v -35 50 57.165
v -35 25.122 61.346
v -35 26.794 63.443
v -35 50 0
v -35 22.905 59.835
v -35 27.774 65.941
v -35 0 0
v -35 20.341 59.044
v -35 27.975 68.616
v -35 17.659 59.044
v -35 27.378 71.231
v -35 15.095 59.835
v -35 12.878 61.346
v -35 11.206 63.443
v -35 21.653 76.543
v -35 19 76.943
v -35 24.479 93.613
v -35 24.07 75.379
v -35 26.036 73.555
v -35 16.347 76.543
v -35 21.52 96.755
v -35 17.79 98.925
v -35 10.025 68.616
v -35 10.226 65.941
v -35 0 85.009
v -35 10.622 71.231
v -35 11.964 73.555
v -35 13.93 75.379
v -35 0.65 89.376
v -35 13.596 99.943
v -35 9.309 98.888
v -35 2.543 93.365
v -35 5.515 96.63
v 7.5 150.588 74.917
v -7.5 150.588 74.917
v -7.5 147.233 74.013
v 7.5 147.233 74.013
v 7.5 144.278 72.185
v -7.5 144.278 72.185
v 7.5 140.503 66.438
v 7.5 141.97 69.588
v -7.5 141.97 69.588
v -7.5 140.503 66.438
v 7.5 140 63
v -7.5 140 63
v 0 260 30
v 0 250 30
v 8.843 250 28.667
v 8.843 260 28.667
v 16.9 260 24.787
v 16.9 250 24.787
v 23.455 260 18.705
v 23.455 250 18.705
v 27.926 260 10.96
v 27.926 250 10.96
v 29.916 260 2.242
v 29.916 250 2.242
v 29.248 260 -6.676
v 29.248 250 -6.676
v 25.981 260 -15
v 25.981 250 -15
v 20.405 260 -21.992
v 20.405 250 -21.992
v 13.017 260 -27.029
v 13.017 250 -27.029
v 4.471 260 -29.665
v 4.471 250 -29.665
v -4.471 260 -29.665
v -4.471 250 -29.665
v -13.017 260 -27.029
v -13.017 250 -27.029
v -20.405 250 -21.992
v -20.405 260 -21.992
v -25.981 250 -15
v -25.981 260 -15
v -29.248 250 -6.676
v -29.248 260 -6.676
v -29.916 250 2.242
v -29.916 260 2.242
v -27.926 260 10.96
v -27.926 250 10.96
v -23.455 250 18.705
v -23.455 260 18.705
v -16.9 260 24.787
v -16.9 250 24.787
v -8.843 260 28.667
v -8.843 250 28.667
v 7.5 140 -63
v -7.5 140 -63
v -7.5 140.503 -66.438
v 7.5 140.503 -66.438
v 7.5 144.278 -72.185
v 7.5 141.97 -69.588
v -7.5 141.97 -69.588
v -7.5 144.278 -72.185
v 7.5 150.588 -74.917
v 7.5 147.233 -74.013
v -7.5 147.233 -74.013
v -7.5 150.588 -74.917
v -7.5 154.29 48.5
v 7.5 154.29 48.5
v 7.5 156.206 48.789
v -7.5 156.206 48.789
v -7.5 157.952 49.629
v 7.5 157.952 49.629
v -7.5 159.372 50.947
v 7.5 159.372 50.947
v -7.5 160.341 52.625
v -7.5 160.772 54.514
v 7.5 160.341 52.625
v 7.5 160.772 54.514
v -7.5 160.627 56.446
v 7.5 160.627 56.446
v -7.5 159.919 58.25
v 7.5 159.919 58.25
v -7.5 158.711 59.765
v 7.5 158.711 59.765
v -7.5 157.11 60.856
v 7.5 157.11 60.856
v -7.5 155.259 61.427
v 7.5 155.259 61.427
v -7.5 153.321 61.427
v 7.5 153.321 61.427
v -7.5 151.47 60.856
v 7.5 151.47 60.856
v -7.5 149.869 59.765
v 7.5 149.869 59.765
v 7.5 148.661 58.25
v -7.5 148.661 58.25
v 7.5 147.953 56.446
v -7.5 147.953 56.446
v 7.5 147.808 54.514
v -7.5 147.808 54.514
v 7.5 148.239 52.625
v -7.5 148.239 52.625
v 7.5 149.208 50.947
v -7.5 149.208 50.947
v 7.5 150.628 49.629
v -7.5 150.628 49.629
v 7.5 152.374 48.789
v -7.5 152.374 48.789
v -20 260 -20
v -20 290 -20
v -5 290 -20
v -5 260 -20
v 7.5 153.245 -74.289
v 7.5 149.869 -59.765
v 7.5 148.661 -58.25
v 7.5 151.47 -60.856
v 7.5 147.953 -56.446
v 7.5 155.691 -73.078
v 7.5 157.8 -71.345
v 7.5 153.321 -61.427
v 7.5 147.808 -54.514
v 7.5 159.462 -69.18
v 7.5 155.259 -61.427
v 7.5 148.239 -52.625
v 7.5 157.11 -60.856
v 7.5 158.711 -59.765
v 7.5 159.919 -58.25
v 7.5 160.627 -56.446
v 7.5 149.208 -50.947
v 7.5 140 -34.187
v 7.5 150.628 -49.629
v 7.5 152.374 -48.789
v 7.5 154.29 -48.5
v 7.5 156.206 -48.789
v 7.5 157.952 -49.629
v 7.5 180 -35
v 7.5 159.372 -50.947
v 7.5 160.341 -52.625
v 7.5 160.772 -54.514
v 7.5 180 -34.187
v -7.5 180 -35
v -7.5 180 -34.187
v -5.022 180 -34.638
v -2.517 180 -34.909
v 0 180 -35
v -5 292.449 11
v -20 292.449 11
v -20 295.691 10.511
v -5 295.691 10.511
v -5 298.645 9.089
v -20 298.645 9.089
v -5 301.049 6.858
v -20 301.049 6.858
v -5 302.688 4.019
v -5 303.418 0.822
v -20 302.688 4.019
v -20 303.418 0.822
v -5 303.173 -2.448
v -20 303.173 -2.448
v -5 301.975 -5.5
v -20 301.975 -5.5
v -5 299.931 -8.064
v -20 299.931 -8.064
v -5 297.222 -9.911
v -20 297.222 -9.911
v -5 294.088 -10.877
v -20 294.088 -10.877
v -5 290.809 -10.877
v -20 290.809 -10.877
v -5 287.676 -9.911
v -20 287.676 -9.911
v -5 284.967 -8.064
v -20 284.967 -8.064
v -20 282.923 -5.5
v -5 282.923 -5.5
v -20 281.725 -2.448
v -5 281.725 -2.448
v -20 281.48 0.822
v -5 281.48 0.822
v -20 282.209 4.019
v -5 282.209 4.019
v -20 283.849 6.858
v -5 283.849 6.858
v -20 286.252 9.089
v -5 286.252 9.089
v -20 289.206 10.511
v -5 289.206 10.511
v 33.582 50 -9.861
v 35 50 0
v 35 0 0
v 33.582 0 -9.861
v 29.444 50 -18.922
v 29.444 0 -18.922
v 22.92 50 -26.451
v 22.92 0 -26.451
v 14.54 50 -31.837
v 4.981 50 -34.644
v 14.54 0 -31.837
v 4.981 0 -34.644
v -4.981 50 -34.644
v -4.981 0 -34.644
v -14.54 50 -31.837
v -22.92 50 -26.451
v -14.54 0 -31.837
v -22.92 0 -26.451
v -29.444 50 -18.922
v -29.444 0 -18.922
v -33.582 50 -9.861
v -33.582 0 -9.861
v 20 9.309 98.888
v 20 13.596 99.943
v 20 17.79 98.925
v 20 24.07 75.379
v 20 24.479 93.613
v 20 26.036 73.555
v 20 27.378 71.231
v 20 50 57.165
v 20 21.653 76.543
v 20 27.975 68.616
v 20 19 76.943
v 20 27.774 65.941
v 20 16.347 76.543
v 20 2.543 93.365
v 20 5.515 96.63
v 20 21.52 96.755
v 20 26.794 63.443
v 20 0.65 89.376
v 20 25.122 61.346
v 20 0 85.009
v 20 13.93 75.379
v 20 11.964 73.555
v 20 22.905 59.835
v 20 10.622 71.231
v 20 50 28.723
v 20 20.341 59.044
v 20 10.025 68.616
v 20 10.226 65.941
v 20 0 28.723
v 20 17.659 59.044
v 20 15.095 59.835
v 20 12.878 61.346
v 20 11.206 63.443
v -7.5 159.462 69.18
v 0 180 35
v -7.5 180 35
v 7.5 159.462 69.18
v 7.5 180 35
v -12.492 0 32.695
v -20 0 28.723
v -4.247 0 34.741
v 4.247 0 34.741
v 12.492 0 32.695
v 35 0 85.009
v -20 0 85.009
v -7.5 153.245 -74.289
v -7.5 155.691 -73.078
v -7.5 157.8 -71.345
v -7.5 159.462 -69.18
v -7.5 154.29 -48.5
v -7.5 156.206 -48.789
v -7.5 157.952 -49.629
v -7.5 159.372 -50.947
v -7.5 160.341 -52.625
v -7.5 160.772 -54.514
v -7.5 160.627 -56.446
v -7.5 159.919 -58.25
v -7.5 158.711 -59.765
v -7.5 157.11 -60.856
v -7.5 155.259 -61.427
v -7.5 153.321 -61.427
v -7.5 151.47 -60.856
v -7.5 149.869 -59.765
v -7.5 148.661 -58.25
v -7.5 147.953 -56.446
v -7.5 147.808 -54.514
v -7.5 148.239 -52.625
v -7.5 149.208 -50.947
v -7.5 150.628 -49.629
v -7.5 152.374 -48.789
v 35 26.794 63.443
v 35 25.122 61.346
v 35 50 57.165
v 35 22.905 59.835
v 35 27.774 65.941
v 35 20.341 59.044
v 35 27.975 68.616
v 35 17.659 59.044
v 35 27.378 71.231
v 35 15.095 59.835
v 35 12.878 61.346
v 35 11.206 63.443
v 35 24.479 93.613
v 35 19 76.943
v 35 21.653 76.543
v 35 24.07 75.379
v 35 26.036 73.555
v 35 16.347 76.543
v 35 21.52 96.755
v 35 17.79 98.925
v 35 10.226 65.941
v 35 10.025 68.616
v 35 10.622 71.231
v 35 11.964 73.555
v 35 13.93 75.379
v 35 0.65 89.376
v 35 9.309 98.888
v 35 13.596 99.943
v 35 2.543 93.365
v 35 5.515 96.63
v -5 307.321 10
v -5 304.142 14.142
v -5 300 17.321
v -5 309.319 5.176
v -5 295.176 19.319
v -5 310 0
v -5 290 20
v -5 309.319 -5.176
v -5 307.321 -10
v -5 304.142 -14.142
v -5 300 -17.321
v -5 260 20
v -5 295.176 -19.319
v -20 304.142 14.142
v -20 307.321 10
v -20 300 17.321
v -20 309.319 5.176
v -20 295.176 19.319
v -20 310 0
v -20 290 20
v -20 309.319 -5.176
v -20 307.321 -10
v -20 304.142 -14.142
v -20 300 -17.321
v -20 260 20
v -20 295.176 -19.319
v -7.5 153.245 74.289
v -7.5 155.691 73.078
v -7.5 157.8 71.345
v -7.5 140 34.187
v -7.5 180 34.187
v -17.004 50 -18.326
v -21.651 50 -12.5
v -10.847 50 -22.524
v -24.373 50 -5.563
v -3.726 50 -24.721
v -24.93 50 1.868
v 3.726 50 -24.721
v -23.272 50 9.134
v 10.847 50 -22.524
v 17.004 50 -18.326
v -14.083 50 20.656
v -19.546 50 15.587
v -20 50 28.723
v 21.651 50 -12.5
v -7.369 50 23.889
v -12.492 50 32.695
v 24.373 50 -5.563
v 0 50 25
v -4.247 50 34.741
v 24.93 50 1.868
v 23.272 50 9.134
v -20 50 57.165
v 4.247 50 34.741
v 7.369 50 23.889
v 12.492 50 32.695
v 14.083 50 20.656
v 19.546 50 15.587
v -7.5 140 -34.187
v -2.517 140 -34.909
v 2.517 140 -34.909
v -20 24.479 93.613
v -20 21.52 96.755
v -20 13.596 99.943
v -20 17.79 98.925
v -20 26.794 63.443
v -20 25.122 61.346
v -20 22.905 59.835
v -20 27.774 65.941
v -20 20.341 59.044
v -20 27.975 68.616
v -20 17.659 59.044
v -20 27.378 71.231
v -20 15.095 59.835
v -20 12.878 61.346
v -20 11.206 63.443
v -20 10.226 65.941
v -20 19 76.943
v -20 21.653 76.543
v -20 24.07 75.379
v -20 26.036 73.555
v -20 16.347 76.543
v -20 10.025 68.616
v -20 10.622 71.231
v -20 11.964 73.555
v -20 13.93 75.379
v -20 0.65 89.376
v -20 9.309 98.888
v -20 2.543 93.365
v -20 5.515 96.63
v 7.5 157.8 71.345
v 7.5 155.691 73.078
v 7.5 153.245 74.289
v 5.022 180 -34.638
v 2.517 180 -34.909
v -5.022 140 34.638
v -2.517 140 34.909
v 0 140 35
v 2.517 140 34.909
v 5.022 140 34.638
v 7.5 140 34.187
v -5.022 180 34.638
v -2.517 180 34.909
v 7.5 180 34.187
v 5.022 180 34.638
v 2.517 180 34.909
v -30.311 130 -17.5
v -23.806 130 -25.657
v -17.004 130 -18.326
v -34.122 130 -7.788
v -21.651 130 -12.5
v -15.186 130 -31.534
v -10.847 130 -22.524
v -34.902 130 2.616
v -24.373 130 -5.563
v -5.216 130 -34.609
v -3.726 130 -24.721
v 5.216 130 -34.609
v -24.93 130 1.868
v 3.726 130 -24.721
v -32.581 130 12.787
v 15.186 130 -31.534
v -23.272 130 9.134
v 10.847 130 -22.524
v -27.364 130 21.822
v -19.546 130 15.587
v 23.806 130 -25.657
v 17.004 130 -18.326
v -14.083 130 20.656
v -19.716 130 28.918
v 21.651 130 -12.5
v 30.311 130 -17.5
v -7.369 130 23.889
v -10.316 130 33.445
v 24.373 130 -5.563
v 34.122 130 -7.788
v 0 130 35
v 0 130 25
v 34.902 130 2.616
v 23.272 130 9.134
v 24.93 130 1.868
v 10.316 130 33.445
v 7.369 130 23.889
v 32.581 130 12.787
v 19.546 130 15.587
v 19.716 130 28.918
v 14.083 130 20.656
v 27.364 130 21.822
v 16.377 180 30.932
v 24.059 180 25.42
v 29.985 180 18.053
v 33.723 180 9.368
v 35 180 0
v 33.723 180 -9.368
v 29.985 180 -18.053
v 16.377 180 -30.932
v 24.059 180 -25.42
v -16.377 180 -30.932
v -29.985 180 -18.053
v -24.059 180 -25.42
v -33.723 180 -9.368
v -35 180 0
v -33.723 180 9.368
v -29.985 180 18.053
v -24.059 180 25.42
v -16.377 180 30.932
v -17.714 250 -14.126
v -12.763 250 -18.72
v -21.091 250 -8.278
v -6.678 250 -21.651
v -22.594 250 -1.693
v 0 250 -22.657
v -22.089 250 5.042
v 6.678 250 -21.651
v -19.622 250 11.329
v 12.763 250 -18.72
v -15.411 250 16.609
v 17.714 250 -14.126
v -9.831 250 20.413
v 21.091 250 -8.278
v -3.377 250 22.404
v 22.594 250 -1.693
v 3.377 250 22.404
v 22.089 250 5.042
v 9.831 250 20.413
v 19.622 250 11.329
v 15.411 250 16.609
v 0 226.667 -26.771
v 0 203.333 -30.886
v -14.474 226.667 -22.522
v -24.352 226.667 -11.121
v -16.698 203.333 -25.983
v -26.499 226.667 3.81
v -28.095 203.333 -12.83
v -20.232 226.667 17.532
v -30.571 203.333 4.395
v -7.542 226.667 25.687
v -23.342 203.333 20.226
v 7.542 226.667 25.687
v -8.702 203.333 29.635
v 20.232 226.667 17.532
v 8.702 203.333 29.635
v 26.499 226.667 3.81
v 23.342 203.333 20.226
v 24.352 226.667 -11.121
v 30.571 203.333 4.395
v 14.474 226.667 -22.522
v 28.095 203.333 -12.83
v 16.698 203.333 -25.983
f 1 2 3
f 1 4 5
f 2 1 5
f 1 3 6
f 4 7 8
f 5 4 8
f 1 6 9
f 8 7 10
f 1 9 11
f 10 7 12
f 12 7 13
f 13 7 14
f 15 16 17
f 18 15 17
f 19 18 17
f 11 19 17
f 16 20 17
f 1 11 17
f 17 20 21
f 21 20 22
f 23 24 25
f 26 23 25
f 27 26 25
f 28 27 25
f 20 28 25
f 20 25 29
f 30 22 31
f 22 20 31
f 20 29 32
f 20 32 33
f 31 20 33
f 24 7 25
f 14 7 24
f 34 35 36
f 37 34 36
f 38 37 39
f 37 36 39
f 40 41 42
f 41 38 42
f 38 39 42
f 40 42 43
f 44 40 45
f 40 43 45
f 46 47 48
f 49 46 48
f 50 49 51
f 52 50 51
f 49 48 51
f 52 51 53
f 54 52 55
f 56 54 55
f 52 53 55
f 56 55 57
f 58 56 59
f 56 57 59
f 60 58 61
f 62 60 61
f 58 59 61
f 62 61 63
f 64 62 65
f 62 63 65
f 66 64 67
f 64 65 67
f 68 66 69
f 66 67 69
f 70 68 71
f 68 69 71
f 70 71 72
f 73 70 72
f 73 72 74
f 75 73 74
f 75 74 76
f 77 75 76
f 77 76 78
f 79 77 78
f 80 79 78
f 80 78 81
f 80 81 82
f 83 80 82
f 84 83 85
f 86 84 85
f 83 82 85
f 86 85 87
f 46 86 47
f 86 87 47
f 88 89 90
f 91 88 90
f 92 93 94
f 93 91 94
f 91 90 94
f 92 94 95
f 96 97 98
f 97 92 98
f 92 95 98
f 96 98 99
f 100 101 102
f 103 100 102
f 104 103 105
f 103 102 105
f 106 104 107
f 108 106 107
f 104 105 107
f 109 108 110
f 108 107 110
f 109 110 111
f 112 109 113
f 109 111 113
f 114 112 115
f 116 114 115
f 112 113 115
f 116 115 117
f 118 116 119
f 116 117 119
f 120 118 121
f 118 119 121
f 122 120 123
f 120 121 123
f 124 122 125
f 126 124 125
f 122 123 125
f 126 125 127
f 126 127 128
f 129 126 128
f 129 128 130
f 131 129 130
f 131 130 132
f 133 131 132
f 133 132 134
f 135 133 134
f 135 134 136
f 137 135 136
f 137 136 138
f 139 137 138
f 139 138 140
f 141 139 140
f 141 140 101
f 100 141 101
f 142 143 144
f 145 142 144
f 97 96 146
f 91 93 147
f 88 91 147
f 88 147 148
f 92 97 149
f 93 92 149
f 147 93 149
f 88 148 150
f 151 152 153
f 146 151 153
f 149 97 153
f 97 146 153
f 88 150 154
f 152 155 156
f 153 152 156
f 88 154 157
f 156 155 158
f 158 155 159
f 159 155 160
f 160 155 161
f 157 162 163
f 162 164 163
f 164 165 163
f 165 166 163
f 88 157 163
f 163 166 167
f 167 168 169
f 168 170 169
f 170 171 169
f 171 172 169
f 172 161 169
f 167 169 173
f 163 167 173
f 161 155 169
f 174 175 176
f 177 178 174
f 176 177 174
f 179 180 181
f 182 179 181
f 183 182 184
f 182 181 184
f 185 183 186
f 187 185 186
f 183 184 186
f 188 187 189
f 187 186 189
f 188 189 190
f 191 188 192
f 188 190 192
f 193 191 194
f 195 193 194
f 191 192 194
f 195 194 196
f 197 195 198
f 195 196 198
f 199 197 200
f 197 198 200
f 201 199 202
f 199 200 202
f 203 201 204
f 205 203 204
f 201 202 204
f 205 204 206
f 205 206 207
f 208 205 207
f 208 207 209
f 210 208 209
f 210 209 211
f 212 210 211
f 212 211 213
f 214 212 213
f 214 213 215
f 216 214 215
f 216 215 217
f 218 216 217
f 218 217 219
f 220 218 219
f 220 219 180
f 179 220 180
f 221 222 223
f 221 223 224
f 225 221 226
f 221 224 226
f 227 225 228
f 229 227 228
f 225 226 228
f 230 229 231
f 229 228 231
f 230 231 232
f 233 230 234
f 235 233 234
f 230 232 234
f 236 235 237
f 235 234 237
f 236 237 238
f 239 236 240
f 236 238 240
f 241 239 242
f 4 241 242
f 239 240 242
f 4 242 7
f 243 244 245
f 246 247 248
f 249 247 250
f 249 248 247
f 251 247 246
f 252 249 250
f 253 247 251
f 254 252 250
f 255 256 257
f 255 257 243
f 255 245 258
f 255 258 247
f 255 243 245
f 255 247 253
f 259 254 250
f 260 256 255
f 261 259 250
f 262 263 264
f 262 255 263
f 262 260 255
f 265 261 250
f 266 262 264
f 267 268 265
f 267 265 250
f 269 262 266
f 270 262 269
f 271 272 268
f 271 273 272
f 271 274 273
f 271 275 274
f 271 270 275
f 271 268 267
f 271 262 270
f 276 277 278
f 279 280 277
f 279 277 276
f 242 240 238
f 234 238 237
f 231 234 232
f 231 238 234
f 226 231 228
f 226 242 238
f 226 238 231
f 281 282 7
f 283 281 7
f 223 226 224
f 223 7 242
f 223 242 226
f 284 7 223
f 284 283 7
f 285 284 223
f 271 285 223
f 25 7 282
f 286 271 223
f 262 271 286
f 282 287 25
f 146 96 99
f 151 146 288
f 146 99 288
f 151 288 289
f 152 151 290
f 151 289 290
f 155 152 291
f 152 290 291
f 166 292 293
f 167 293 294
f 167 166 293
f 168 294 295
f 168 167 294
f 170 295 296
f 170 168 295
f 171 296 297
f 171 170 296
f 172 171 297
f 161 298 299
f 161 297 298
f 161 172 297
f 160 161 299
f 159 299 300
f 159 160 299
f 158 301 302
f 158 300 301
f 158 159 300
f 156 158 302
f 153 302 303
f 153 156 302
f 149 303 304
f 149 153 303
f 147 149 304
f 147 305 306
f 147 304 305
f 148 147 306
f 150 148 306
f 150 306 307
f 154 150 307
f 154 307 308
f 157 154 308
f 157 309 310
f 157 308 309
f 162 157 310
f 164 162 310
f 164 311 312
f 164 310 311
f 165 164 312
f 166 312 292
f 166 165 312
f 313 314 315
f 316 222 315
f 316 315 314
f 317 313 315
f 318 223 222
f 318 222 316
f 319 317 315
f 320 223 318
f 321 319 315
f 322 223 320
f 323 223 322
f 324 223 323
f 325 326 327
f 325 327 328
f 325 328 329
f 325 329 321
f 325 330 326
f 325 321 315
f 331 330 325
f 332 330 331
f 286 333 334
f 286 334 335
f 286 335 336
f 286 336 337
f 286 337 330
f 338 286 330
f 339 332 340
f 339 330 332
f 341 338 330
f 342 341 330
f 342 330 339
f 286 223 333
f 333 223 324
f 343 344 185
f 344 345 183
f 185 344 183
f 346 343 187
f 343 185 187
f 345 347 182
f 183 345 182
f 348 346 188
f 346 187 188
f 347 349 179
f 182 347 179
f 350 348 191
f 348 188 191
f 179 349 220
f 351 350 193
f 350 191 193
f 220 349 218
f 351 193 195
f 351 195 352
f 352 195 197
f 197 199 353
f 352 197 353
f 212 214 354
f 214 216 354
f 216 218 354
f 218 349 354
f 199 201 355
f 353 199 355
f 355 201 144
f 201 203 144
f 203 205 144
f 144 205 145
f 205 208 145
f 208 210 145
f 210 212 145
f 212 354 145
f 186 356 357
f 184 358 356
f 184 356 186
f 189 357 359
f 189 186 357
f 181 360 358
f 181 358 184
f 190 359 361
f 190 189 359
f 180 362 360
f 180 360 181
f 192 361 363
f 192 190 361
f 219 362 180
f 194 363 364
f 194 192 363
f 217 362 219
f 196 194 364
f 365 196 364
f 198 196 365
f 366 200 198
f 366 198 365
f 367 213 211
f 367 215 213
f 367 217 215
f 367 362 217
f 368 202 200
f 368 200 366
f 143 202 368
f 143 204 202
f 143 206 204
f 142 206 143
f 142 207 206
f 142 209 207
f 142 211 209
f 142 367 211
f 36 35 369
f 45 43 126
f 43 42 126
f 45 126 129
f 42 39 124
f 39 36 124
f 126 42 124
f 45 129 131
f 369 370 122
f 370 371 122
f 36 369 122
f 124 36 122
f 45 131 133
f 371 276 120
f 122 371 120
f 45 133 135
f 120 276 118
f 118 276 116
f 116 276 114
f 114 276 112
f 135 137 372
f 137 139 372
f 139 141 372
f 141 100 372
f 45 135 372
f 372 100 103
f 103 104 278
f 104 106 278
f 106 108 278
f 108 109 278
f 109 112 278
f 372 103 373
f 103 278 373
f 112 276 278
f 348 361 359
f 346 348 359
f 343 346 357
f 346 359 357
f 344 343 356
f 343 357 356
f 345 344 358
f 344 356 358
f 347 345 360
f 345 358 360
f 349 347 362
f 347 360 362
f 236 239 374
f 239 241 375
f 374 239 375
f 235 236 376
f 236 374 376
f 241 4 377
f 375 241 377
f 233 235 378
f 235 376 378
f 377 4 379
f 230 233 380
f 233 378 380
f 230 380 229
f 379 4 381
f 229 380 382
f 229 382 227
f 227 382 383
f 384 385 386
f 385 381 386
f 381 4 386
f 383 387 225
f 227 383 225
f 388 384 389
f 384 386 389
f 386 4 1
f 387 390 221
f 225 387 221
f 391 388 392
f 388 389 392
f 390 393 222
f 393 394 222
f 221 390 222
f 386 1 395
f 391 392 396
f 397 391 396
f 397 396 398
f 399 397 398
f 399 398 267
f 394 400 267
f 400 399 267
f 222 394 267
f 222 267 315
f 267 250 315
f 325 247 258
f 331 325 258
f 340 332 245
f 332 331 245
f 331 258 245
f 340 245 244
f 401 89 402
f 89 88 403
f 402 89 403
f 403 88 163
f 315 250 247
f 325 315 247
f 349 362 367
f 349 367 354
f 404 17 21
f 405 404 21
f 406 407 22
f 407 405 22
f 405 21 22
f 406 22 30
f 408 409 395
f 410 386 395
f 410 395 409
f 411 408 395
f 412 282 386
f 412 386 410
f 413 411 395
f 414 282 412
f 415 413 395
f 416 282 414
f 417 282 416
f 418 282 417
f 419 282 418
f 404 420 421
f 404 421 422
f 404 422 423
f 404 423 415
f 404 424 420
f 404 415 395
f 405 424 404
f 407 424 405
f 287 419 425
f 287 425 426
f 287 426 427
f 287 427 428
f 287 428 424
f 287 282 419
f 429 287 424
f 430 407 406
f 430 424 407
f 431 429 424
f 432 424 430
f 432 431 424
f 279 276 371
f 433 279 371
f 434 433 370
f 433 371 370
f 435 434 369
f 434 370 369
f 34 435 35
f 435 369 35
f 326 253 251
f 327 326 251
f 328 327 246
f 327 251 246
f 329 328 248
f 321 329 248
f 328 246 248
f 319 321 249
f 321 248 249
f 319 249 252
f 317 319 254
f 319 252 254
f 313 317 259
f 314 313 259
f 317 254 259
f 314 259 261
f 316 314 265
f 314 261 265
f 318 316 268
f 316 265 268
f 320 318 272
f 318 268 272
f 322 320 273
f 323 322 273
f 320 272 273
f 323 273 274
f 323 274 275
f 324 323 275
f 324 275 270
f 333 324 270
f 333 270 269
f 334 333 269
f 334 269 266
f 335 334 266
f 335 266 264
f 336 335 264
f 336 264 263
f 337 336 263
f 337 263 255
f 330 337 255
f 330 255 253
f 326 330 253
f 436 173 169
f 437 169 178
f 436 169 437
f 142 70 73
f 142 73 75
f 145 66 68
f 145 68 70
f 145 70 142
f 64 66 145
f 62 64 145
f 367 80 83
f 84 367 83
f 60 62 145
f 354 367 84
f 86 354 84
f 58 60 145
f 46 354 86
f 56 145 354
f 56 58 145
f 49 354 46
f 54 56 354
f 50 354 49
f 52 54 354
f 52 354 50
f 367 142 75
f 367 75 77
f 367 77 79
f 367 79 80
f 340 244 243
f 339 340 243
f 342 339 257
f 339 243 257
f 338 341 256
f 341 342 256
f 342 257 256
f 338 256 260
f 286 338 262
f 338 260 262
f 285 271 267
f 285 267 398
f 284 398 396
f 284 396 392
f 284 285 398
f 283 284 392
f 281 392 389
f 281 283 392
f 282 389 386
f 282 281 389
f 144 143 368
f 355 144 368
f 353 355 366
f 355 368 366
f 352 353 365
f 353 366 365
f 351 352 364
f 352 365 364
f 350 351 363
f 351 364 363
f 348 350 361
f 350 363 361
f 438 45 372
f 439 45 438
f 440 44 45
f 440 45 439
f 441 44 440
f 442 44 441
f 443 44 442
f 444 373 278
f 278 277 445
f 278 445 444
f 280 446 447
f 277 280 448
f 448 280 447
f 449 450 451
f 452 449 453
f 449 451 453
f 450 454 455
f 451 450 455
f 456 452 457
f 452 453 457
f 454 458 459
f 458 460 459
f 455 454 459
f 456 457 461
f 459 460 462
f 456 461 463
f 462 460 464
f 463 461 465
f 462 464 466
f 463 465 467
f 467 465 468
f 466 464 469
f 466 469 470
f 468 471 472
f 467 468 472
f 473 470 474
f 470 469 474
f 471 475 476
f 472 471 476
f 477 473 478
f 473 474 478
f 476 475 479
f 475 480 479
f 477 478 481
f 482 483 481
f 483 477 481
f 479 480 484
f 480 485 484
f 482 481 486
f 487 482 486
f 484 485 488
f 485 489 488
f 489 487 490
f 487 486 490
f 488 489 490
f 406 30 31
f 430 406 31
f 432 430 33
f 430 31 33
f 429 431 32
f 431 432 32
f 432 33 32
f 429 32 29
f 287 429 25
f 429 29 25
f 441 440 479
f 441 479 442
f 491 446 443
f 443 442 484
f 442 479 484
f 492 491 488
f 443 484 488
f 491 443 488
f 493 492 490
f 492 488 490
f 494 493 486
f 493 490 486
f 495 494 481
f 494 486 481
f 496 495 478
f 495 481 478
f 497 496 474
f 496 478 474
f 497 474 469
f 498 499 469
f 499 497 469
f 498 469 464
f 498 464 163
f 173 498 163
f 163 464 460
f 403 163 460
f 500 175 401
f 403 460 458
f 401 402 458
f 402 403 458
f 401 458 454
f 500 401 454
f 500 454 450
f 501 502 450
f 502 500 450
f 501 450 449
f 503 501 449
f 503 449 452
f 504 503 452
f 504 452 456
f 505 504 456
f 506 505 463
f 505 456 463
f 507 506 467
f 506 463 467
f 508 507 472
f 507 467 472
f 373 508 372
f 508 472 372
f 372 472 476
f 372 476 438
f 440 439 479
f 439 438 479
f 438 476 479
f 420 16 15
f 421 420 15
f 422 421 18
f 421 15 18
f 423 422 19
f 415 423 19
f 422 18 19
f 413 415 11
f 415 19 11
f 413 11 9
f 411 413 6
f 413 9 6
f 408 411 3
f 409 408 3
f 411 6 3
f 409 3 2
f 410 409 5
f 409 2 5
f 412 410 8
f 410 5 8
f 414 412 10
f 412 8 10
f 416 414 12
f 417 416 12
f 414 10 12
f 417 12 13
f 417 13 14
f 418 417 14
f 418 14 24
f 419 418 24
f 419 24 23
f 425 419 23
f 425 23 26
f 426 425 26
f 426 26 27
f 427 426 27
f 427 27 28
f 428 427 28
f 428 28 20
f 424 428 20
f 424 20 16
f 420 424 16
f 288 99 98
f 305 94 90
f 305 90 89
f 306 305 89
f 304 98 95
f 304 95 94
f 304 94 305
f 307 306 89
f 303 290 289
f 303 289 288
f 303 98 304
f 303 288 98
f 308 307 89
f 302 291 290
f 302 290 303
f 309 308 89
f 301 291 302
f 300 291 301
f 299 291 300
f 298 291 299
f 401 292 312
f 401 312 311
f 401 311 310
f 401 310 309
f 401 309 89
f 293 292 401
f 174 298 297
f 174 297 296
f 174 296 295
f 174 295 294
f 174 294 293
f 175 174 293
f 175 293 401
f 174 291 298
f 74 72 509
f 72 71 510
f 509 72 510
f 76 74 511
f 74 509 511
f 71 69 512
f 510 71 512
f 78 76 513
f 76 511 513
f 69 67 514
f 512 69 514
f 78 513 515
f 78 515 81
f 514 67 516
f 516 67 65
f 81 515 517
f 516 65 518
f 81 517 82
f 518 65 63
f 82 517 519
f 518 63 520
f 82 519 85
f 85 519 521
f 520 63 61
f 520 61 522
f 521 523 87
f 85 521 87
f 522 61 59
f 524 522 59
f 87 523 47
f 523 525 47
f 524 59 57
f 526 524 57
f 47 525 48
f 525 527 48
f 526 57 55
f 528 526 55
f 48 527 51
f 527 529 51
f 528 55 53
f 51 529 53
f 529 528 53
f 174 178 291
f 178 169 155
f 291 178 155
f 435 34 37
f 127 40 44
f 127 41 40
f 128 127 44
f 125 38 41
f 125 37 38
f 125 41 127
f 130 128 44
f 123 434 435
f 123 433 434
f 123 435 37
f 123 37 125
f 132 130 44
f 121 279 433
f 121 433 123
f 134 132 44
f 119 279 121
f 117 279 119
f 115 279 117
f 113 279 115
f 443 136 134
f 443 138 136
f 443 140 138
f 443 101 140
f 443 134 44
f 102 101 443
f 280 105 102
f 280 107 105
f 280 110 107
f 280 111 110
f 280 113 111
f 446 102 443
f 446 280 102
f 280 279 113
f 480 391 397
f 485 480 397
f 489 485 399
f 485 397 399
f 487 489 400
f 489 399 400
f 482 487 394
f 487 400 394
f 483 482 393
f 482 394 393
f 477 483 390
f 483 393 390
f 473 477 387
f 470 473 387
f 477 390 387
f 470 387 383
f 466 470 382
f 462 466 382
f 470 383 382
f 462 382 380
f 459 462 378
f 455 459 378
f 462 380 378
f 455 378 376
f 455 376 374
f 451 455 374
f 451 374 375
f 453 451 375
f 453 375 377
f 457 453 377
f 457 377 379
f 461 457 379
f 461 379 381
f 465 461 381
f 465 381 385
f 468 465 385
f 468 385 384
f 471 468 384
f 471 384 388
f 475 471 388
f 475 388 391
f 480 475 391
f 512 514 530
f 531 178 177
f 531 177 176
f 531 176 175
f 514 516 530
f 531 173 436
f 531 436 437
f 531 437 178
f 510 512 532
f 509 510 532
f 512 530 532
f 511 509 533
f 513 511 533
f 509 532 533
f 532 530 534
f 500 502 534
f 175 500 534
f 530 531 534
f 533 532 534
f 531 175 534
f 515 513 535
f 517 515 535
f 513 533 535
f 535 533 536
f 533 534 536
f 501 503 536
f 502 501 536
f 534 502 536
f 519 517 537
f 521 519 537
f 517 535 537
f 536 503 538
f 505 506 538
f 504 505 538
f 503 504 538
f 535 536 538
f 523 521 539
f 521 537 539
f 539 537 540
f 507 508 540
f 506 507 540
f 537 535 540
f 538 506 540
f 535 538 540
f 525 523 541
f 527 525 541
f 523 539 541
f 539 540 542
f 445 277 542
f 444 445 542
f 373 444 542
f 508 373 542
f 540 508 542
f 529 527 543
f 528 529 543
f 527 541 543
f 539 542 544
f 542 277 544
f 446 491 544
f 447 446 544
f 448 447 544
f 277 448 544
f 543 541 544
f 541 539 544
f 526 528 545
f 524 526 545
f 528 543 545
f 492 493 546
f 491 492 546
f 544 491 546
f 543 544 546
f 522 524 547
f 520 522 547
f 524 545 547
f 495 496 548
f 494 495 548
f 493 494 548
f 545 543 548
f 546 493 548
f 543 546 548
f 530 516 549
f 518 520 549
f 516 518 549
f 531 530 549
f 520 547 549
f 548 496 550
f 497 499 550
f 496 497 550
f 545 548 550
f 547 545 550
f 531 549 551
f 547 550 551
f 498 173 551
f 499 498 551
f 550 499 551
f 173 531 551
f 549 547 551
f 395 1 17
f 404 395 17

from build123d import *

# Parameters (mm, degrees)
SKETCH1_R           = 35
BOSS_EXTRUDE1_DEPTH = 50
SKETCH6_R           = 25
BOSS_EXTRUDE2_DEPTH = 80
SKETCH7_R           = 35
BOSS_EXTRUDE3_DEPTH = 50
SKETCH10_R          = 30
BOSS_EXTRUDE5_DEPTH = 10
SKETCH12_W          = 70
SKETCH12_H          = 100.009163948
BOSS_EXTRUDE6_DEPTH = 50
CUT_EXTRUDE1_DEPTH  = 288.231322933
CUT_EXTRUDE2_DEPTH  = 281.761166962
FILLET1_R           = 15
SKETCH15_R          = 9
CUT_EXTRUDE3_DEPTH  = 288.208392811
BOSS_EXTRUDE8_DEPTH = 7.5
FILLET2_R           = 12
SKETCH17_R          = 6.5
CUT_EXTRUDE4_DEPTH  = 282.771025659
FILLET3_R           = 12
SKETCH18_W          = 15
SKETCH18_H          = 40
BOSS_EXTRUDE9_DEPTH = 50
CUT_EXTRUDE5_DEPTH  = 331.323570005
SKETCH20_R          = 11
CUT_EXTRUDE6_DEPTH  = 331.323570005


with BuildPart() as part:
    # Sketch1 → Boss-Extrude1 (new body)
    with BuildSketch(Plane(origin=(0, 0, 0), x_dir=(1, 0, 0), z_dir=(0, 1, 0))):
        with Locations(Location((0, 0, 0), (0, 0, 270))):
            Circle(SKETCH1_R)
    extrude(amount=BOSS_EXTRUDE1_DEPTH)

    # Sketch6 → Boss-Extrude2 (add)
    with BuildSketch(Plane(origin=(0, 50, 0), x_dir=(1, 0, 0), z_dir=(0, 1, 0))):
        with Locations(Location((0, 0, 0), (0, 0, 270))):
            Circle(SKETCH6_R)
    extrude(amount=BOSS_EXTRUDE2_DEPTH)

    # Sketch7 → Boss-Extrude3 (add)
    with BuildSketch(Plane(origin=(0, 130, 0), x_dir=(1, 0, 0), z_dir=(0, 1, 0))):
        with Locations(Location((0, 0, 0), (0, 0, 270))):
            Circle(SKETCH7_R)
    extrude(amount=BOSS_EXTRUDE3_DEPTH)



with BuildPart() as body_2:
    # Sketch10 → Boss-Extrude5 (new body)
    with BuildSketch(Plane(origin=(0, 250, 0), x_dir=(1, 0, 0), z_dir=(0, 1, 0))):
        with Locations(Location((0, 0, 0), (0, 0, 270))):
            Circle(SKETCH10_R)
    extrude(amount=BOSS_EXTRUDE5_DEPTH)


with BuildPart() as part_1:
    add(part.part)

    add(body_2.part)  # Revolve1 merges body 2
    # Sketch11 → Revolve1 (revolve)
    with BuildSketch(Plane(origin=(0, 0, 0), x_dir=(0, 0, -1), z_dir=(1, 0, 0))):
        Polygon((0, 250), (22.65711135, 250), (35, 180), (0, 180), align=None)
    revolve(axis=Axis((0, 180, 0), (0, 1, 0)))

    # Sketch12 → Boss-Extrude6 (add)
    with BuildSketch(Plane.XZ):
        with Locations((0, 50.004581974)):
            Rectangle(SKETCH12_W, SKETCH12_H)
    extrude(amount=-BOSS_EXTRUDE6_DEPTH)

    # Sketch13 → Cut-Extrude1 (cut, through all)
    with BuildSketch(Plane.ZY.offset(35)):
        Polygon((57.164723746, 50), (100.009163948, 20), (100.009163948, 50), align=None)
    extrude(amount=-CUT_EXTRUDE1_DEPTH, mode=Mode.SUBTRACT)

    # Sketch14 → Cut-Extrude2 (cut, through all)
    with BuildSketch(Plane.XZ):
        with BuildLine():
            Line((-20, 108.740570097), (20, 108.740570097))
            Line((20, 108.740570097), (20, 28.722813233))
            ThreePointArc((20, 28.722813233), (0, 35), (-20, 28.722813233))
            Line((-20, 28.722813233), (-20, 108.740570097))
        make_face()
    extrude(amount=-CUT_EXTRUDE2_DEPTH, mode=Mode.SUBTRACT)

    # Fillet1
    # the kernel refuses this fillet: 15 mm, written as the material it takes off along each edge
    with BuildSketch(Plane(origin=(-17.5, 0, 100.009163948), x_dir=(0, 0, -1), z_dir=(1, 0, 0)), Plane(origin=(-72.5, 0, 100.009163948), x_dir=(0, 0, -1), z_dir=(1, 0, 0))) as fillet1_piece_1:
        with BuildLine():
            CenterArc((FILLET1_R, FILLET1_R), FILLET1_R, 180, 90)
            Line((0, FILLET1_R), (0, 0))
            Line((0, 0), (FILLET1_R, 0))
        make_face()
    extrude(amount=90, mode=Mode.SUBTRACT)
    with BuildSketch(Plane(origin=(0.478735604, 20, 100.009163948), x_dir=(0, -1, 0), z_dir=(1, 0, 0)), Plane(origin=(-54.521264396, 20, 100.009163948), x_dir=(0, -1, 0), z_dir=(1, 0, 0))) as fillet1_piece_2:
        with BuildLine():
            CenterArc((FILLET1_R * 0.520567050552, FILLET1_R), FILLET1_R, 215, 55)
            Line((-FILLET1_R * 0.298584993737, FILLET1_R * 0.426423563649), (0, 0))
            Line((0, 0), (FILLET1_R * 0.520567050552, 0))
        make_face()
    extrude(amount=54.042528791, mode=Mode.SUBTRACT)

    # Sketch15 → Cut-Extrude3 (cut, through all)
    with BuildSketch(Plane.ZY.offset(35)):
        with Locations((67.943288424, 19)):
            Circle(SKETCH15_R)
    extrude(amount=-CUT_EXTRUDE3_DEPTH, mode=Mode.SUBTRACT)

    # Sketch16 → Boss-Extrude8 (add, symmetric)
    with BuildSketch(Plane(origin=(0, 0, 0), x_dir=(0, 0, -1), z_dir=(1, 0, 0))):
        Polygon((-35, 180), (-75, 155.965575239), (-75, 140), (-35, 140), (0, 140), (0, 180), align=None)
    boss_extrude8 = extrude(amount=BOSS_EXTRUDE8_DEPTH, both=True)

    # Fillet2
    # the kernel refuses this fillet: 12 mm, written as the material it takes off along each edge
    with BuildSketch(Plane(origin=(-37.5, 140, 75), x_dir=(0, 0, -1), z_dir=(1, 0, 0))) as fillet2_piece_1:
        with BuildLine():
            CenterArc((FILLET2_R, FILLET2_R), FILLET2_R, 180, 90)
            Line((0, FILLET2_R), (0, 0))
            Line((0, 0), (FILLET2_R, 0))
        make_face()
    extrude(amount=75, mode=Mode.SUBTRACT)
    with BuildSketch(Plane(origin=(-24.473183346, 155.965575239, 75), x_dir=(0, 0.5150380749100483, -0.8571673007021159), z_dir=(1, 0, 0))) as fillet2_piece_2:
        with BuildLine():
            CenterArc((FILLET2_R * 0.565772778188, -FILLET2_R), FILLET2_R, 90, 59)
            Line((-FILLET2_R * 0.291394522514, -FILLET2_R * 0.48496192509), (0, 0))
            Line((0, 0), (FILLET2_R * 0.565772778188, 0))
        make_face()
    extrude(amount=48.946366691, mode=Mode.SUBTRACT)

    # Sketch17 → Cut-Extrude4 (cut, through all)
    with BuildSketch(Plane(origin=(7.5, 0, 0), x_dir=(0, 0, -1), z_dir=(1, 0, 0))):
        with Locations((-55, 154.29)):
            Circle(SKETCH17_R)
    cut_extrude4 = extrude(amount=-CUT_EXTRUDE4_DEPTH, mode=Mode.SUBTRACT)

    # Mirror1: Boss-Extrude8 across plane
    add(boss_extrude8.mirror(Plane.XY))

    # Fillet3
    # the kernel refuses this fillet: 12 mm, written as the material it takes off along each edge
    with BuildSketch(Plane(origin=(-37.5, 140, -75), x_dir=(0, 0, 1), z_dir=(1, 0, 0))) as fillet3_piece_1:
        with BuildLine():
            CenterArc((FILLET3_R, -FILLET3_R), FILLET3_R, 90, 90)
            Line((0, -FILLET3_R), (0, 0))
            Line((0, 0), (FILLET3_R, 0))
        make_face()
    extrude(amount=75, mode=Mode.SUBTRACT)
    with BuildSketch(Plane(origin=(-24.473183346, 155.965575239, -75), x_dir=(0, 0.5150380749100483, 0.8571673007021159), z_dir=(1, 0, 0))) as fillet3_piece_2:
        with BuildLine():
            CenterArc((FILLET3_R * 0.565772778188, FILLET3_R), FILLET3_R, 211, 59)
            Line((-FILLET3_R * 0.291394522514, FILLET3_R * 0.48496192509), (0, 0))
            Line((0, 0), (FILLET3_R * 0.565772778188, 0))
        make_face()
    extrude(amount=48.946366691, mode=Mode.SUBTRACT)

    # Mirror2: Cut-Extrude4 across plane
    add(cut_extrude4.mirror(Plane.XY), mode=Mode.SUBTRACT)

    # Sketch18 → Boss-Extrude9 (add)
    with BuildSketch(Plane(origin=(0, 260, 0), x_dir=(1, 0, 0), z_dir=(0, 1, 0))):
        with Locations((-12.5, 0)):
            Rectangle(SKETCH18_W, SKETCH18_H)
    extrude(amount=BOSS_EXTRUDE9_DEPTH)

    # Sketch19 → Cut-Extrude5 (cut, through all)
    with BuildSketch(Plane.ZY.offset(20)):
        with BuildLine():
            Line((20, 310), (-1.45e-07, 310))
            ThreePointArc((-1.45e-07, 310), (14.142135572, 304.142135675), (20, 290))
            Line((20, 290), (20, 310))
        make_face()
        with BuildLine():
            Line((-20, 310), (-20, 290))
            ThreePointArc((-20, 290), (-14.142135675, 304.142135572), (-1.45e-07, 310))
            Line((-1.45e-07, 310), (-20, 310))
        make_face()
    extrude(amount=-CUT_EXTRUDE5_DEPTH, mode=Mode.SUBTRACT)

    # Sketch20 → Cut-Extrude6 (cut, through all)
    with BuildSketch(Plane.ZY.offset(20)):
        with Locations((0, 292.448780647)):
            Circle(SKETCH20_R)
    extrude(amount=-CUT_EXTRUDE6_DEPTH, mode=Mode.SUBTRACT)


solid = part_1.part
